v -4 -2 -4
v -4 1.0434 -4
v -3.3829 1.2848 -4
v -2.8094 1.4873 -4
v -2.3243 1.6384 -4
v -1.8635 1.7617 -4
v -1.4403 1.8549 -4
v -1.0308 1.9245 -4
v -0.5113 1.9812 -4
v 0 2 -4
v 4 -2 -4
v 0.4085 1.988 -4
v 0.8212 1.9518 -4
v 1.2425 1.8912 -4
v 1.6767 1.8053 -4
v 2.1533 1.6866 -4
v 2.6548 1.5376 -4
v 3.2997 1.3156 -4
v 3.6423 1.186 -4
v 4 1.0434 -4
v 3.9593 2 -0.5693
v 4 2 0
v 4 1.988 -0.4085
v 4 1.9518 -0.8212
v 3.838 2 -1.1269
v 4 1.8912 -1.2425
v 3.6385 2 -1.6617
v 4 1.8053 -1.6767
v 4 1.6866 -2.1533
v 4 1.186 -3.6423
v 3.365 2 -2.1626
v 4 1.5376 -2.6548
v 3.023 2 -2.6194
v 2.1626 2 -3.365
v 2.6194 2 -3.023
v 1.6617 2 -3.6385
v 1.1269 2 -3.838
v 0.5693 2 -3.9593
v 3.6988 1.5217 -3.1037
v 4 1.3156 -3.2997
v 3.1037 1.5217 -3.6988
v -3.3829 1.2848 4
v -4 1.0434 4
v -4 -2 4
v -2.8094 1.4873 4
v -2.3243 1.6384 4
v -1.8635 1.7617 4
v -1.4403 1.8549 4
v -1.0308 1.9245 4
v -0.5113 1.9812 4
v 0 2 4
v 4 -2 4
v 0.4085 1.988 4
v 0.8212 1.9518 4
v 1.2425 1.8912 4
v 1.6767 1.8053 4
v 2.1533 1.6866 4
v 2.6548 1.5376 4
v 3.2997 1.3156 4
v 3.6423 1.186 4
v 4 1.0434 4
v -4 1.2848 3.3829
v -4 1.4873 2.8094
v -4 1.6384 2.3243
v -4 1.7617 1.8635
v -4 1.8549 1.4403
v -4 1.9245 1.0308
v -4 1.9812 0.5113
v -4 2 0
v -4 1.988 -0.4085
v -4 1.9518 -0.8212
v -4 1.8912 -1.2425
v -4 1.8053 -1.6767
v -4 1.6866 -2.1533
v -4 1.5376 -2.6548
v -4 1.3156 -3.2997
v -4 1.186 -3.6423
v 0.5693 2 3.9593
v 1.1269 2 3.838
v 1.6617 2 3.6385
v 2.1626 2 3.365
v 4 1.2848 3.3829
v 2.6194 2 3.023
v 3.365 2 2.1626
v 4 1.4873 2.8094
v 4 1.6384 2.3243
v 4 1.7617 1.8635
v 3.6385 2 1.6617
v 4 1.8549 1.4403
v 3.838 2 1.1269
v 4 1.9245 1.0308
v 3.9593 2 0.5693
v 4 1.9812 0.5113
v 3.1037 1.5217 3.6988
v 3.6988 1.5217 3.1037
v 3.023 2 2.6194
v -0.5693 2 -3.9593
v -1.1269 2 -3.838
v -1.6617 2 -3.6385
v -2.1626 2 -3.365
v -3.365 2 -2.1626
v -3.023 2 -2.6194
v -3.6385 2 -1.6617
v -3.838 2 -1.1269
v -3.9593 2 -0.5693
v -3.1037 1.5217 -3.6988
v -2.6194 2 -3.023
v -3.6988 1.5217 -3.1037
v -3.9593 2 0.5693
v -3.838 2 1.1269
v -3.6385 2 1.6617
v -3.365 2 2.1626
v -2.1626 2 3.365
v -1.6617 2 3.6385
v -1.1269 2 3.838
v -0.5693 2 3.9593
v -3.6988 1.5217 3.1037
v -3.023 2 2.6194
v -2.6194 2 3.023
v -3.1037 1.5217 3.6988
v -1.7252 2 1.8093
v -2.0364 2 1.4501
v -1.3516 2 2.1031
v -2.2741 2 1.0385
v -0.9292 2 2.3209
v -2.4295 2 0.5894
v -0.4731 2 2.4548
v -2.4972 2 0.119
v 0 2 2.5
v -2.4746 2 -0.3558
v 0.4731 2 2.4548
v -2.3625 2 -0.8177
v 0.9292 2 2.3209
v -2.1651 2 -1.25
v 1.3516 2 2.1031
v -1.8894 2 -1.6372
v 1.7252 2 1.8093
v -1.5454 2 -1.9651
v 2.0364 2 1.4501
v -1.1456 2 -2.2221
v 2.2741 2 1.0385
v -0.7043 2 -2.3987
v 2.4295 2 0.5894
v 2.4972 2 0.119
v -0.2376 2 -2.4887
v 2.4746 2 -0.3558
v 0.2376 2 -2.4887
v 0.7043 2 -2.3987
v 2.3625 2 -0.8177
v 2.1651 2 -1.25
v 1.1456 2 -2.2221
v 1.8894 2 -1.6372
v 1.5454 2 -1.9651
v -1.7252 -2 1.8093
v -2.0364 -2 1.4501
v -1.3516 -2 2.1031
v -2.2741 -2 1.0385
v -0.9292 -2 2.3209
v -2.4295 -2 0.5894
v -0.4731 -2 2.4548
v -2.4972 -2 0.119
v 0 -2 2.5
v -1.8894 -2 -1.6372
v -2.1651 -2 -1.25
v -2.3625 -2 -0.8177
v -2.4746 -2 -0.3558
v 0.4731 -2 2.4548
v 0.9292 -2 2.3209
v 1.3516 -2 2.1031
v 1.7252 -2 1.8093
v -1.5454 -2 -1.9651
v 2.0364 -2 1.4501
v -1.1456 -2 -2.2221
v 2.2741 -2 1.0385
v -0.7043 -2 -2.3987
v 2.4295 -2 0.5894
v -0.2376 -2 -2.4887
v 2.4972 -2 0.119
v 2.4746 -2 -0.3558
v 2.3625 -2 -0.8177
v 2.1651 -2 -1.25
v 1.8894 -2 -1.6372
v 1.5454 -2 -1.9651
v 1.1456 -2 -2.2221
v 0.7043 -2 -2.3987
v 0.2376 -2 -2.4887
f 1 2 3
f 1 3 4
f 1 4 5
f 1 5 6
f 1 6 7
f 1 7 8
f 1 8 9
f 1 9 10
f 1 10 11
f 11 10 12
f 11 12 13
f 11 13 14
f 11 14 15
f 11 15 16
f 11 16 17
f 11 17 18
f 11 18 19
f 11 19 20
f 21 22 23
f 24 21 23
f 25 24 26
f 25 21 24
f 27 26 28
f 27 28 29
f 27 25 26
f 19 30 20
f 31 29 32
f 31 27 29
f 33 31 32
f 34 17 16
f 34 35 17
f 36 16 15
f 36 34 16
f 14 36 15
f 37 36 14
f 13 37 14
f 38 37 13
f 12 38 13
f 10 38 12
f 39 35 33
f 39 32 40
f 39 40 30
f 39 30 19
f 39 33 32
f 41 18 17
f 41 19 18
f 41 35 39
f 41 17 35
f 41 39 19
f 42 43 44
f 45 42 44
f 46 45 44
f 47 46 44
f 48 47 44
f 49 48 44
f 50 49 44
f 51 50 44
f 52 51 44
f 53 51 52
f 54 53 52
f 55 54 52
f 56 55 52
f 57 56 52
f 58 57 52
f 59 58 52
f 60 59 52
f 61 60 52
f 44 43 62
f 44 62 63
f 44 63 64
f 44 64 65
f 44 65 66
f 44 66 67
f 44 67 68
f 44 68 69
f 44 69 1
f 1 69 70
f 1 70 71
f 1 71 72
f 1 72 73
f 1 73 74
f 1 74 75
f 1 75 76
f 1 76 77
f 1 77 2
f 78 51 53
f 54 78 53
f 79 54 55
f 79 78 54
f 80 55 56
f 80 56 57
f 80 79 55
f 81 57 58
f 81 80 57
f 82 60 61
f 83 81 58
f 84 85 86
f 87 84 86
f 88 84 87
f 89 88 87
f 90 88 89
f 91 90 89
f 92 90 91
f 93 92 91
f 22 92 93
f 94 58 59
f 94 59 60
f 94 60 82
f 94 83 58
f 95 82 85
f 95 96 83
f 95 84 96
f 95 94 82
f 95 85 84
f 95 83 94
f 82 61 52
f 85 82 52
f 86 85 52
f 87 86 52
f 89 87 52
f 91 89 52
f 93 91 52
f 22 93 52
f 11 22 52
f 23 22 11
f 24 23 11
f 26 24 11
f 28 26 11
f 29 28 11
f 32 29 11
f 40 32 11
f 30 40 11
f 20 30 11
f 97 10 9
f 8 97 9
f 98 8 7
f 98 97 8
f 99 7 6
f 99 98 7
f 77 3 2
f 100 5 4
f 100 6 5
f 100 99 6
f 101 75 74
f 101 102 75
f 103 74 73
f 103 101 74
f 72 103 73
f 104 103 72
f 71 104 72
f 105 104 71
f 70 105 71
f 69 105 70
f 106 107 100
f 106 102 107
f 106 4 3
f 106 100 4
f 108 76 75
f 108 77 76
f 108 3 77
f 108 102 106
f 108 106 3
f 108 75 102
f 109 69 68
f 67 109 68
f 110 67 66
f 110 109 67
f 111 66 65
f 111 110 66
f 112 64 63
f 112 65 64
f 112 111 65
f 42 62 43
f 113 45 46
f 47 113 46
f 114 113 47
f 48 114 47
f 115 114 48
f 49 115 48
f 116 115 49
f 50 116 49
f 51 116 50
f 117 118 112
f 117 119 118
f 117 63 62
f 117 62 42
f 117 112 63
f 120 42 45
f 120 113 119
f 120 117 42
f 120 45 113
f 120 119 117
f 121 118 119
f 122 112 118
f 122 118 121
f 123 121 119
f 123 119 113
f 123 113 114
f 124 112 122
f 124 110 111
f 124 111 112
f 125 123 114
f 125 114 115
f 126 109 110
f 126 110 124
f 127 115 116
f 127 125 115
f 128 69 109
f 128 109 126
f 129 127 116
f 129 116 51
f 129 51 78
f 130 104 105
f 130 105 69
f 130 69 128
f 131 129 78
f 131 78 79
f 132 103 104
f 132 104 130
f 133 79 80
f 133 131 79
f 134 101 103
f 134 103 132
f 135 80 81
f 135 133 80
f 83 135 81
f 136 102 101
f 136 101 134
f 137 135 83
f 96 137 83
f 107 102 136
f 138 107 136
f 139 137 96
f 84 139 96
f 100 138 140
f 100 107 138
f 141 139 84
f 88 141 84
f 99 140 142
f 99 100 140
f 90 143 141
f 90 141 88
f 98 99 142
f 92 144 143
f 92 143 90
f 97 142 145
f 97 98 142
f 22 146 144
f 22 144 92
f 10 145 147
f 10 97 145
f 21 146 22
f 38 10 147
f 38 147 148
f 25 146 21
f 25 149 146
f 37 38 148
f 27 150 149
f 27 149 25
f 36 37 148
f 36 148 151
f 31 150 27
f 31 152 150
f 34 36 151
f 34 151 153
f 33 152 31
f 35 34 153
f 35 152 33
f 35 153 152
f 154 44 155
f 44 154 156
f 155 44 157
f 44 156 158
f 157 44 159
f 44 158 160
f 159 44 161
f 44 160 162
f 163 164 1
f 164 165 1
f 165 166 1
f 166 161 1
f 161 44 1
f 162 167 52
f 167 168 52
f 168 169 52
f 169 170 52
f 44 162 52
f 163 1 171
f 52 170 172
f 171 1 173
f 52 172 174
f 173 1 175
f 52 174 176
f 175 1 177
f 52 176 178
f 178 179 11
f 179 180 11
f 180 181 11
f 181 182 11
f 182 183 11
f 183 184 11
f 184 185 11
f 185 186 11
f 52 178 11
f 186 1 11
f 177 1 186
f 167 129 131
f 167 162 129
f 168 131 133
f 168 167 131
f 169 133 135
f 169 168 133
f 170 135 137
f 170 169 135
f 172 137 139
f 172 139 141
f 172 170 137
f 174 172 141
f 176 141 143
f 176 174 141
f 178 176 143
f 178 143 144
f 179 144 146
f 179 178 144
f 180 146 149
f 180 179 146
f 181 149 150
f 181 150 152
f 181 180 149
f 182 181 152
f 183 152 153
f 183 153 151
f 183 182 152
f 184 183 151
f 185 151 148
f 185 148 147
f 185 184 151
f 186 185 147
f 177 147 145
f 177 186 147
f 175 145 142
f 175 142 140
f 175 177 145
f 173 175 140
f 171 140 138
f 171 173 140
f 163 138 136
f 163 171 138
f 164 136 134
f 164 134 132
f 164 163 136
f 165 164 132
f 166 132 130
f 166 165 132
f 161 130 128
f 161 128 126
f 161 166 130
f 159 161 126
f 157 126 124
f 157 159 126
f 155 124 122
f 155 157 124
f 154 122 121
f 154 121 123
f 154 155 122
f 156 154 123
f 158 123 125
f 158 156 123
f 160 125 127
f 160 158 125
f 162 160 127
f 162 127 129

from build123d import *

# Parameters (mm, degrees)
SKETCH1_W           = 8
SKETCH1_H           = 8
SKETCH1_R           = 2.5
BOSS_EXTRUDE1_DEPTH = 2
SKETCH5_OUTSIDE_W   = 39.864
SKETCH5_OUTSIDE_H   = 39.864
SKETCH5_OUTSIDE_R   = 4
CUT_EXTRUDE2_DEPTH  = 7.92820323
CUT_EXTRUDE2_DRAFT  = -60


with BuildPart() as part:
    # Sketch1 → Boss-Extrude1 (new, symmetric)
    with BuildSketch(Plane(origin=(0, 0, 0), x_dir=(1, 0, 0), z_dir=(0, 1, 0))):
        Rectangle(SKETCH1_W, SKETCH1_H)
        Circle(SKETCH1_R, mode=Mode.SUBTRACT)
    extrude(amount=BOSS_EXTRUDE1_DEPTH, both=True)


with BuildPart() as cut_extrude2_tool:
    # Sketch5 outside → Cut-Extrude2 (with draft: the straight prism first)
    with BuildSketch(Plane(origin=(0, 2, 0), x_dir=(1, 0, 0), z_dir=(0, 1, 0))):
        Rectangle(SKETCH5_OUTSIDE_W, SKETCH5_OUTSIDE_H)
        Circle(SKETCH5_OUTSIDE_R, mode=Mode.SUBTRACT)
    extrude(amount=-CUT_EXTRUDE2_DEPTH)
    # Cut-Extrude2: the draft: its side faces are tilted about the plane it starts from
    cut_extrude2_sides = [cut_extrude2_tool.faces().sort_by_distance(p)[0] for p in [
        (0, -1.964101615, 19.932),
        (19.932, -1.964101615, 0),
        (0, -1.964101615, -19.932),
        (-19.932, -1.964101615, 0),
        (-4, -1.964101615, 0),
    ]]
    draft(cut_extrude2_sides, Plane(origin=(0, 2, 0), x_dir=(1, 0, 0), z_dir=(0, 1, 0)), CUT_EXTRUDE2_DRAFT)


with BuildPart() as part_1:
    add(part.part)

    # Cut-Extrude2: cut by cut_extrude2_tool
    add(cut_extrude2_tool.part, mode=Mode.SUBTRACT)


solid = part_1.part
